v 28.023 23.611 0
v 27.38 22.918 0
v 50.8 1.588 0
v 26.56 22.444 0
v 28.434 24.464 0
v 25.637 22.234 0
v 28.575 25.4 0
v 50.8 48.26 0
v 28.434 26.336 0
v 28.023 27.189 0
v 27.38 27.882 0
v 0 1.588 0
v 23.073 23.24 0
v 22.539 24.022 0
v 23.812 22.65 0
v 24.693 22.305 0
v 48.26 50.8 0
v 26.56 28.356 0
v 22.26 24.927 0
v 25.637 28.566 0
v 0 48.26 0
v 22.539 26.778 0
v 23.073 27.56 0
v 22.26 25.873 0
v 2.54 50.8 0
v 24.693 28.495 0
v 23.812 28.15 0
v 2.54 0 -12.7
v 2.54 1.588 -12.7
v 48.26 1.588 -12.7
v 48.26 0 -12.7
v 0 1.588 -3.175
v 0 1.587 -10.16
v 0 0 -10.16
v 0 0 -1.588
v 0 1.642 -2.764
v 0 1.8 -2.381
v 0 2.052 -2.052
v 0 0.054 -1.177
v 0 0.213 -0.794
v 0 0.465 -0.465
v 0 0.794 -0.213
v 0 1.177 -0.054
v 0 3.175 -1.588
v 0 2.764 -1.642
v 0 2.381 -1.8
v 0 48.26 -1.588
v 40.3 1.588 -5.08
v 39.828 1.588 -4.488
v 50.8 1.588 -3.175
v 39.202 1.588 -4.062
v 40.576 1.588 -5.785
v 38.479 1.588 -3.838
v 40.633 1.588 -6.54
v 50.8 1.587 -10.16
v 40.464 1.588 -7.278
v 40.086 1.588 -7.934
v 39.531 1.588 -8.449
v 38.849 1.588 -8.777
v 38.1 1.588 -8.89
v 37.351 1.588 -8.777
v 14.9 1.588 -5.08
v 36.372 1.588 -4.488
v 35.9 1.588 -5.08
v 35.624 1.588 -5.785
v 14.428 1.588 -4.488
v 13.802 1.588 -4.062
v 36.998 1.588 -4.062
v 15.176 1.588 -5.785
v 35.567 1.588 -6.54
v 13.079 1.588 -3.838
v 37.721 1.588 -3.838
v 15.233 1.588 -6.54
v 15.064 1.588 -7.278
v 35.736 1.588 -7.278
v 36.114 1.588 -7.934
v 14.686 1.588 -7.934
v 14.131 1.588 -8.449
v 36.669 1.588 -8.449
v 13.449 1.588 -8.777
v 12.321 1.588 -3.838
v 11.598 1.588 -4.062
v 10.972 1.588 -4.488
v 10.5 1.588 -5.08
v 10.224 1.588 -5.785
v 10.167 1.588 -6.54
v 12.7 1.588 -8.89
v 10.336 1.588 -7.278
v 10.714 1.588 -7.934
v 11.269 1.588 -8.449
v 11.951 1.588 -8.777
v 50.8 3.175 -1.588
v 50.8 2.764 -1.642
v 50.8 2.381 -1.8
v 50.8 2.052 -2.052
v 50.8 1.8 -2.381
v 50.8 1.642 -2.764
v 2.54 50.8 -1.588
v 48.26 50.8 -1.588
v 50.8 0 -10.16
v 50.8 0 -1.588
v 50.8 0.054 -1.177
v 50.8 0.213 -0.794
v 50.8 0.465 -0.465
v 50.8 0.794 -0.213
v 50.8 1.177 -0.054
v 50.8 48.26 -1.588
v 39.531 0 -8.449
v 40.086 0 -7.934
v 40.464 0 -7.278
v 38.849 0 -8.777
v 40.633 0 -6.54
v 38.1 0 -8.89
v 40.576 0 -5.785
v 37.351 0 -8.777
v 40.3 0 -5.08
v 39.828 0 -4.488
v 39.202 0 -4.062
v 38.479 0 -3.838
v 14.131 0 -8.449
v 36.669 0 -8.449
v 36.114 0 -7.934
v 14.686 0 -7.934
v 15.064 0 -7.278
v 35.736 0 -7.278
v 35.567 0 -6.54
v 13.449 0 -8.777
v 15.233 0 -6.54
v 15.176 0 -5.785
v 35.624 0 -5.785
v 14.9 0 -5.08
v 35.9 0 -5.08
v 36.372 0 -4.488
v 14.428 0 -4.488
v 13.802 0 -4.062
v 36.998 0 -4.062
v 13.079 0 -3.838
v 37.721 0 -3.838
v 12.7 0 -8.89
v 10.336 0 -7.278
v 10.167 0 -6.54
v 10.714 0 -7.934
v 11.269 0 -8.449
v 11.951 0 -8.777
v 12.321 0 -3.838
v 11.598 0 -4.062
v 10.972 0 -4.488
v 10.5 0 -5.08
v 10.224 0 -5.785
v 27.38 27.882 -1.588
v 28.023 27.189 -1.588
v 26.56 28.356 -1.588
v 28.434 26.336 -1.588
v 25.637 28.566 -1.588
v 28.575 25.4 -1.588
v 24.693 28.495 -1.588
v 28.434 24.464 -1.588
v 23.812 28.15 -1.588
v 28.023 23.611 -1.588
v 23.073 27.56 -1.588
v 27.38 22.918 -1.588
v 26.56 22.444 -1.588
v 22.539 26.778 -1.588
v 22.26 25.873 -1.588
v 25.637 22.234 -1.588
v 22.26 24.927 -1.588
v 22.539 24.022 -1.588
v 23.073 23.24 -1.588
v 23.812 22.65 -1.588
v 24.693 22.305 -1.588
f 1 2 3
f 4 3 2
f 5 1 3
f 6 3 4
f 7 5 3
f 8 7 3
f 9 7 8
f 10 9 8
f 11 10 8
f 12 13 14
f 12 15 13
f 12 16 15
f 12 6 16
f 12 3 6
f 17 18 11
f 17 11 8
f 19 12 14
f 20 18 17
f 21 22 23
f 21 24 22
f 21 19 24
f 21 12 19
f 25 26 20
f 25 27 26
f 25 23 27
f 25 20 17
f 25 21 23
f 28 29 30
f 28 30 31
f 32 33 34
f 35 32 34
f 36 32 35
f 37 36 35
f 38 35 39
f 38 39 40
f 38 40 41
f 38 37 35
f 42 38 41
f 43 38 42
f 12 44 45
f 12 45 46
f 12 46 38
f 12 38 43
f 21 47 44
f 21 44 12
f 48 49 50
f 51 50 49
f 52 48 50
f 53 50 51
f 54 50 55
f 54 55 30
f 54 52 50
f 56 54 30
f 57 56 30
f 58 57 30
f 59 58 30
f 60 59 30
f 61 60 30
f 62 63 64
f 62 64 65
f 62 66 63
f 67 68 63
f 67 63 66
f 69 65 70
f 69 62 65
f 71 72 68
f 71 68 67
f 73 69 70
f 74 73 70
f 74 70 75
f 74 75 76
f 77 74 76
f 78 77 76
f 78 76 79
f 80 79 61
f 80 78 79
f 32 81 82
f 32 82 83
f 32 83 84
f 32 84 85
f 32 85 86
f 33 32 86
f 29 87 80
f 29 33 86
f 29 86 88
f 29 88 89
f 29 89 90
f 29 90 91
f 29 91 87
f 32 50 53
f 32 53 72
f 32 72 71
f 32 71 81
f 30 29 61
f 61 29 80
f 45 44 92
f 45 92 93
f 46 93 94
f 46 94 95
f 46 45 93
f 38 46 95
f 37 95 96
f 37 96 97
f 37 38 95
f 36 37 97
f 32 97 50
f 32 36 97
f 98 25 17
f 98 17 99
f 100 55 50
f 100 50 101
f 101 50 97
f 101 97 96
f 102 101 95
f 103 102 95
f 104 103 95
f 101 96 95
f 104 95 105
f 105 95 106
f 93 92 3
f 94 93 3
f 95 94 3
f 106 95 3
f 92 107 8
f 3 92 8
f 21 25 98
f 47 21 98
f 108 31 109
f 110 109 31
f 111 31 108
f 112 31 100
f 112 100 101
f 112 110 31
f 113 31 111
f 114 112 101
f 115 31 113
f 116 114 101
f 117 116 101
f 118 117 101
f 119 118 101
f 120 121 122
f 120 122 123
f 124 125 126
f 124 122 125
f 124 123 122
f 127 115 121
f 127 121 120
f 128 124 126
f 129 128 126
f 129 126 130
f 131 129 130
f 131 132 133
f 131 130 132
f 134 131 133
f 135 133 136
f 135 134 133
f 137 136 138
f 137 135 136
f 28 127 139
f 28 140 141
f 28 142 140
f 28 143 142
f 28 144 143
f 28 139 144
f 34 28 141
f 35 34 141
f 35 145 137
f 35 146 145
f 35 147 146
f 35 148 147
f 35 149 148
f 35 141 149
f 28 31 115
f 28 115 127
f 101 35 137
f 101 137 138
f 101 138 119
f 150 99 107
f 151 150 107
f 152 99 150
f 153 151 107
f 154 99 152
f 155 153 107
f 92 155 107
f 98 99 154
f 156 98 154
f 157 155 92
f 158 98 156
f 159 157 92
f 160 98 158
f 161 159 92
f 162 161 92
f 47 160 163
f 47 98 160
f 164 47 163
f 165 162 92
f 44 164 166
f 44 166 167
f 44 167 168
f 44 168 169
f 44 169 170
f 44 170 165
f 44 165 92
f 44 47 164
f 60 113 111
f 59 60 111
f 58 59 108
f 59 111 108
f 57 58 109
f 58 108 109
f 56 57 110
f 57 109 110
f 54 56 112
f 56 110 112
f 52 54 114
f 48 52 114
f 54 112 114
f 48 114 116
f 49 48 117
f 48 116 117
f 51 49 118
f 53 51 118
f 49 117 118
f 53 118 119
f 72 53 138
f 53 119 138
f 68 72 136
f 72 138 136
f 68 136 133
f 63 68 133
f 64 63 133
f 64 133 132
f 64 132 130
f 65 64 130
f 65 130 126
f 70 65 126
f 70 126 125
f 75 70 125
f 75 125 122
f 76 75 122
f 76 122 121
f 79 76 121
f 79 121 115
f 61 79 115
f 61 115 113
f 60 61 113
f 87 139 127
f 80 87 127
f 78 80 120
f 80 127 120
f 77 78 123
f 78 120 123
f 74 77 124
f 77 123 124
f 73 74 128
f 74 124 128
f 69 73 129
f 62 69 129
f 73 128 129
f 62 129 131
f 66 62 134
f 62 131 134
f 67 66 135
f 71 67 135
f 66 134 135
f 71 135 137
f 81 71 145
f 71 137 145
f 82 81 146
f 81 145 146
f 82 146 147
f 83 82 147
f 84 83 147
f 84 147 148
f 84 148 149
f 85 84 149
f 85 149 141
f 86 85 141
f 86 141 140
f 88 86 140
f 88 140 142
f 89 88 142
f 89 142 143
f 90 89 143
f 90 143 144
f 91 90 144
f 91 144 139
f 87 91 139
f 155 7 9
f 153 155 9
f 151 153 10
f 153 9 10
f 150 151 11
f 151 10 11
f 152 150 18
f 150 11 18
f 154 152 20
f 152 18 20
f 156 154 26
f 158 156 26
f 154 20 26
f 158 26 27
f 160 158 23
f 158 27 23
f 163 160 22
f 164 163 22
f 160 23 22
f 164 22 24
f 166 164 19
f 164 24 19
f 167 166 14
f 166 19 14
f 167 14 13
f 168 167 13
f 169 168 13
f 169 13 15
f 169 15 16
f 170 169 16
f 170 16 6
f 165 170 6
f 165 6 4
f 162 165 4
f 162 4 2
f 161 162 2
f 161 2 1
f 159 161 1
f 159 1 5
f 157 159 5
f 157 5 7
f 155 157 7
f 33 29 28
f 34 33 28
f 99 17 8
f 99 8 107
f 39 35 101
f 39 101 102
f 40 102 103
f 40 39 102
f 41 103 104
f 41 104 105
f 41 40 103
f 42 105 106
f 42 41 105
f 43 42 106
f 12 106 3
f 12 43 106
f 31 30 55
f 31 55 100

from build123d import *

# Parameters (mm, degrees)
BOSS_EXTRUDE1_DEPTH = 50.8
SKETCH2_R           = 2.54
CUT_EXTRUDE1_DEPTH  = 73.955945611
SKETCH3_R           = 3.175
CUT_EXTRUDE2_DEPTH  = 73.955945611
CHAMFER1_SIZE       = 2.54


with BuildPart() as part:
    # Sketch1 → Boss-Extrude1 (new body)
    with BuildSketch(Plane(origin=(0, 0, 0), x_dir=(0, 0, -1), z_dir=(1, 0, 0))):
        with BuildLine():
            Line((0, 1.5875), (0, 50.8))
            Line((0, 50.8), (1.5875, 50.8))
            Line((1.5875, 50.8), (1.5875, 3.175))
            ThreePointArc((1.5875, 3.175), (2.052467985, 2.052467985), (3.175, 1.5875))
            Line((3.175, 1.5875), (12.7, 1.5875))
            Line((12.7, 1.5875), (12.7, 0))
            Line((12.7, 0), (1.5875, 0))
            ThreePointArc((1.5875, 0), (0.464967985, 0.464967985), (0, 1.5875))
        make_face()
    extrude(amount=BOSS_EXTRUDE1_DEPTH)

    # Sketch2 → Cut-Extrude1 (cut, through all)
    with BuildSketch(Plane.XZ):
        with Locations(Location((38.1, -6.35, 0), (0, 0, 270))):
            Circle(SKETCH2_R)
        with Locations(Location((12.7, -6.35, 0), (0, 0, 270))):
            Circle(SKETCH2_R)
    extrude(amount=-CUT_EXTRUDE1_DEPTH, mode=Mode.SUBTRACT)

    # Sketch3 → Cut-Extrude2 (cut, through all)
    with BuildSketch(Plane.XY):
        with Locations((25.4, 25.4)):
            Circle(SKETCH3_R)
    extrude(amount=-CUT_EXTRUDE2_DEPTH, mode=Mode.SUBTRACT)

    # Chamfer1
    chamfer1_edges = [part.edges().sort_by_distance(p)[0] for p in [
        (0, 50.8, -0.79375),
        (50.8, 0.79375, -12.7),
        (50.8, 50.8, -0.79375),
        (0, 0.79375, -12.7),
    ]]
    chamfer(chamfer1_edges, length=CHAMFER1_SIZE)


solid = part.part
